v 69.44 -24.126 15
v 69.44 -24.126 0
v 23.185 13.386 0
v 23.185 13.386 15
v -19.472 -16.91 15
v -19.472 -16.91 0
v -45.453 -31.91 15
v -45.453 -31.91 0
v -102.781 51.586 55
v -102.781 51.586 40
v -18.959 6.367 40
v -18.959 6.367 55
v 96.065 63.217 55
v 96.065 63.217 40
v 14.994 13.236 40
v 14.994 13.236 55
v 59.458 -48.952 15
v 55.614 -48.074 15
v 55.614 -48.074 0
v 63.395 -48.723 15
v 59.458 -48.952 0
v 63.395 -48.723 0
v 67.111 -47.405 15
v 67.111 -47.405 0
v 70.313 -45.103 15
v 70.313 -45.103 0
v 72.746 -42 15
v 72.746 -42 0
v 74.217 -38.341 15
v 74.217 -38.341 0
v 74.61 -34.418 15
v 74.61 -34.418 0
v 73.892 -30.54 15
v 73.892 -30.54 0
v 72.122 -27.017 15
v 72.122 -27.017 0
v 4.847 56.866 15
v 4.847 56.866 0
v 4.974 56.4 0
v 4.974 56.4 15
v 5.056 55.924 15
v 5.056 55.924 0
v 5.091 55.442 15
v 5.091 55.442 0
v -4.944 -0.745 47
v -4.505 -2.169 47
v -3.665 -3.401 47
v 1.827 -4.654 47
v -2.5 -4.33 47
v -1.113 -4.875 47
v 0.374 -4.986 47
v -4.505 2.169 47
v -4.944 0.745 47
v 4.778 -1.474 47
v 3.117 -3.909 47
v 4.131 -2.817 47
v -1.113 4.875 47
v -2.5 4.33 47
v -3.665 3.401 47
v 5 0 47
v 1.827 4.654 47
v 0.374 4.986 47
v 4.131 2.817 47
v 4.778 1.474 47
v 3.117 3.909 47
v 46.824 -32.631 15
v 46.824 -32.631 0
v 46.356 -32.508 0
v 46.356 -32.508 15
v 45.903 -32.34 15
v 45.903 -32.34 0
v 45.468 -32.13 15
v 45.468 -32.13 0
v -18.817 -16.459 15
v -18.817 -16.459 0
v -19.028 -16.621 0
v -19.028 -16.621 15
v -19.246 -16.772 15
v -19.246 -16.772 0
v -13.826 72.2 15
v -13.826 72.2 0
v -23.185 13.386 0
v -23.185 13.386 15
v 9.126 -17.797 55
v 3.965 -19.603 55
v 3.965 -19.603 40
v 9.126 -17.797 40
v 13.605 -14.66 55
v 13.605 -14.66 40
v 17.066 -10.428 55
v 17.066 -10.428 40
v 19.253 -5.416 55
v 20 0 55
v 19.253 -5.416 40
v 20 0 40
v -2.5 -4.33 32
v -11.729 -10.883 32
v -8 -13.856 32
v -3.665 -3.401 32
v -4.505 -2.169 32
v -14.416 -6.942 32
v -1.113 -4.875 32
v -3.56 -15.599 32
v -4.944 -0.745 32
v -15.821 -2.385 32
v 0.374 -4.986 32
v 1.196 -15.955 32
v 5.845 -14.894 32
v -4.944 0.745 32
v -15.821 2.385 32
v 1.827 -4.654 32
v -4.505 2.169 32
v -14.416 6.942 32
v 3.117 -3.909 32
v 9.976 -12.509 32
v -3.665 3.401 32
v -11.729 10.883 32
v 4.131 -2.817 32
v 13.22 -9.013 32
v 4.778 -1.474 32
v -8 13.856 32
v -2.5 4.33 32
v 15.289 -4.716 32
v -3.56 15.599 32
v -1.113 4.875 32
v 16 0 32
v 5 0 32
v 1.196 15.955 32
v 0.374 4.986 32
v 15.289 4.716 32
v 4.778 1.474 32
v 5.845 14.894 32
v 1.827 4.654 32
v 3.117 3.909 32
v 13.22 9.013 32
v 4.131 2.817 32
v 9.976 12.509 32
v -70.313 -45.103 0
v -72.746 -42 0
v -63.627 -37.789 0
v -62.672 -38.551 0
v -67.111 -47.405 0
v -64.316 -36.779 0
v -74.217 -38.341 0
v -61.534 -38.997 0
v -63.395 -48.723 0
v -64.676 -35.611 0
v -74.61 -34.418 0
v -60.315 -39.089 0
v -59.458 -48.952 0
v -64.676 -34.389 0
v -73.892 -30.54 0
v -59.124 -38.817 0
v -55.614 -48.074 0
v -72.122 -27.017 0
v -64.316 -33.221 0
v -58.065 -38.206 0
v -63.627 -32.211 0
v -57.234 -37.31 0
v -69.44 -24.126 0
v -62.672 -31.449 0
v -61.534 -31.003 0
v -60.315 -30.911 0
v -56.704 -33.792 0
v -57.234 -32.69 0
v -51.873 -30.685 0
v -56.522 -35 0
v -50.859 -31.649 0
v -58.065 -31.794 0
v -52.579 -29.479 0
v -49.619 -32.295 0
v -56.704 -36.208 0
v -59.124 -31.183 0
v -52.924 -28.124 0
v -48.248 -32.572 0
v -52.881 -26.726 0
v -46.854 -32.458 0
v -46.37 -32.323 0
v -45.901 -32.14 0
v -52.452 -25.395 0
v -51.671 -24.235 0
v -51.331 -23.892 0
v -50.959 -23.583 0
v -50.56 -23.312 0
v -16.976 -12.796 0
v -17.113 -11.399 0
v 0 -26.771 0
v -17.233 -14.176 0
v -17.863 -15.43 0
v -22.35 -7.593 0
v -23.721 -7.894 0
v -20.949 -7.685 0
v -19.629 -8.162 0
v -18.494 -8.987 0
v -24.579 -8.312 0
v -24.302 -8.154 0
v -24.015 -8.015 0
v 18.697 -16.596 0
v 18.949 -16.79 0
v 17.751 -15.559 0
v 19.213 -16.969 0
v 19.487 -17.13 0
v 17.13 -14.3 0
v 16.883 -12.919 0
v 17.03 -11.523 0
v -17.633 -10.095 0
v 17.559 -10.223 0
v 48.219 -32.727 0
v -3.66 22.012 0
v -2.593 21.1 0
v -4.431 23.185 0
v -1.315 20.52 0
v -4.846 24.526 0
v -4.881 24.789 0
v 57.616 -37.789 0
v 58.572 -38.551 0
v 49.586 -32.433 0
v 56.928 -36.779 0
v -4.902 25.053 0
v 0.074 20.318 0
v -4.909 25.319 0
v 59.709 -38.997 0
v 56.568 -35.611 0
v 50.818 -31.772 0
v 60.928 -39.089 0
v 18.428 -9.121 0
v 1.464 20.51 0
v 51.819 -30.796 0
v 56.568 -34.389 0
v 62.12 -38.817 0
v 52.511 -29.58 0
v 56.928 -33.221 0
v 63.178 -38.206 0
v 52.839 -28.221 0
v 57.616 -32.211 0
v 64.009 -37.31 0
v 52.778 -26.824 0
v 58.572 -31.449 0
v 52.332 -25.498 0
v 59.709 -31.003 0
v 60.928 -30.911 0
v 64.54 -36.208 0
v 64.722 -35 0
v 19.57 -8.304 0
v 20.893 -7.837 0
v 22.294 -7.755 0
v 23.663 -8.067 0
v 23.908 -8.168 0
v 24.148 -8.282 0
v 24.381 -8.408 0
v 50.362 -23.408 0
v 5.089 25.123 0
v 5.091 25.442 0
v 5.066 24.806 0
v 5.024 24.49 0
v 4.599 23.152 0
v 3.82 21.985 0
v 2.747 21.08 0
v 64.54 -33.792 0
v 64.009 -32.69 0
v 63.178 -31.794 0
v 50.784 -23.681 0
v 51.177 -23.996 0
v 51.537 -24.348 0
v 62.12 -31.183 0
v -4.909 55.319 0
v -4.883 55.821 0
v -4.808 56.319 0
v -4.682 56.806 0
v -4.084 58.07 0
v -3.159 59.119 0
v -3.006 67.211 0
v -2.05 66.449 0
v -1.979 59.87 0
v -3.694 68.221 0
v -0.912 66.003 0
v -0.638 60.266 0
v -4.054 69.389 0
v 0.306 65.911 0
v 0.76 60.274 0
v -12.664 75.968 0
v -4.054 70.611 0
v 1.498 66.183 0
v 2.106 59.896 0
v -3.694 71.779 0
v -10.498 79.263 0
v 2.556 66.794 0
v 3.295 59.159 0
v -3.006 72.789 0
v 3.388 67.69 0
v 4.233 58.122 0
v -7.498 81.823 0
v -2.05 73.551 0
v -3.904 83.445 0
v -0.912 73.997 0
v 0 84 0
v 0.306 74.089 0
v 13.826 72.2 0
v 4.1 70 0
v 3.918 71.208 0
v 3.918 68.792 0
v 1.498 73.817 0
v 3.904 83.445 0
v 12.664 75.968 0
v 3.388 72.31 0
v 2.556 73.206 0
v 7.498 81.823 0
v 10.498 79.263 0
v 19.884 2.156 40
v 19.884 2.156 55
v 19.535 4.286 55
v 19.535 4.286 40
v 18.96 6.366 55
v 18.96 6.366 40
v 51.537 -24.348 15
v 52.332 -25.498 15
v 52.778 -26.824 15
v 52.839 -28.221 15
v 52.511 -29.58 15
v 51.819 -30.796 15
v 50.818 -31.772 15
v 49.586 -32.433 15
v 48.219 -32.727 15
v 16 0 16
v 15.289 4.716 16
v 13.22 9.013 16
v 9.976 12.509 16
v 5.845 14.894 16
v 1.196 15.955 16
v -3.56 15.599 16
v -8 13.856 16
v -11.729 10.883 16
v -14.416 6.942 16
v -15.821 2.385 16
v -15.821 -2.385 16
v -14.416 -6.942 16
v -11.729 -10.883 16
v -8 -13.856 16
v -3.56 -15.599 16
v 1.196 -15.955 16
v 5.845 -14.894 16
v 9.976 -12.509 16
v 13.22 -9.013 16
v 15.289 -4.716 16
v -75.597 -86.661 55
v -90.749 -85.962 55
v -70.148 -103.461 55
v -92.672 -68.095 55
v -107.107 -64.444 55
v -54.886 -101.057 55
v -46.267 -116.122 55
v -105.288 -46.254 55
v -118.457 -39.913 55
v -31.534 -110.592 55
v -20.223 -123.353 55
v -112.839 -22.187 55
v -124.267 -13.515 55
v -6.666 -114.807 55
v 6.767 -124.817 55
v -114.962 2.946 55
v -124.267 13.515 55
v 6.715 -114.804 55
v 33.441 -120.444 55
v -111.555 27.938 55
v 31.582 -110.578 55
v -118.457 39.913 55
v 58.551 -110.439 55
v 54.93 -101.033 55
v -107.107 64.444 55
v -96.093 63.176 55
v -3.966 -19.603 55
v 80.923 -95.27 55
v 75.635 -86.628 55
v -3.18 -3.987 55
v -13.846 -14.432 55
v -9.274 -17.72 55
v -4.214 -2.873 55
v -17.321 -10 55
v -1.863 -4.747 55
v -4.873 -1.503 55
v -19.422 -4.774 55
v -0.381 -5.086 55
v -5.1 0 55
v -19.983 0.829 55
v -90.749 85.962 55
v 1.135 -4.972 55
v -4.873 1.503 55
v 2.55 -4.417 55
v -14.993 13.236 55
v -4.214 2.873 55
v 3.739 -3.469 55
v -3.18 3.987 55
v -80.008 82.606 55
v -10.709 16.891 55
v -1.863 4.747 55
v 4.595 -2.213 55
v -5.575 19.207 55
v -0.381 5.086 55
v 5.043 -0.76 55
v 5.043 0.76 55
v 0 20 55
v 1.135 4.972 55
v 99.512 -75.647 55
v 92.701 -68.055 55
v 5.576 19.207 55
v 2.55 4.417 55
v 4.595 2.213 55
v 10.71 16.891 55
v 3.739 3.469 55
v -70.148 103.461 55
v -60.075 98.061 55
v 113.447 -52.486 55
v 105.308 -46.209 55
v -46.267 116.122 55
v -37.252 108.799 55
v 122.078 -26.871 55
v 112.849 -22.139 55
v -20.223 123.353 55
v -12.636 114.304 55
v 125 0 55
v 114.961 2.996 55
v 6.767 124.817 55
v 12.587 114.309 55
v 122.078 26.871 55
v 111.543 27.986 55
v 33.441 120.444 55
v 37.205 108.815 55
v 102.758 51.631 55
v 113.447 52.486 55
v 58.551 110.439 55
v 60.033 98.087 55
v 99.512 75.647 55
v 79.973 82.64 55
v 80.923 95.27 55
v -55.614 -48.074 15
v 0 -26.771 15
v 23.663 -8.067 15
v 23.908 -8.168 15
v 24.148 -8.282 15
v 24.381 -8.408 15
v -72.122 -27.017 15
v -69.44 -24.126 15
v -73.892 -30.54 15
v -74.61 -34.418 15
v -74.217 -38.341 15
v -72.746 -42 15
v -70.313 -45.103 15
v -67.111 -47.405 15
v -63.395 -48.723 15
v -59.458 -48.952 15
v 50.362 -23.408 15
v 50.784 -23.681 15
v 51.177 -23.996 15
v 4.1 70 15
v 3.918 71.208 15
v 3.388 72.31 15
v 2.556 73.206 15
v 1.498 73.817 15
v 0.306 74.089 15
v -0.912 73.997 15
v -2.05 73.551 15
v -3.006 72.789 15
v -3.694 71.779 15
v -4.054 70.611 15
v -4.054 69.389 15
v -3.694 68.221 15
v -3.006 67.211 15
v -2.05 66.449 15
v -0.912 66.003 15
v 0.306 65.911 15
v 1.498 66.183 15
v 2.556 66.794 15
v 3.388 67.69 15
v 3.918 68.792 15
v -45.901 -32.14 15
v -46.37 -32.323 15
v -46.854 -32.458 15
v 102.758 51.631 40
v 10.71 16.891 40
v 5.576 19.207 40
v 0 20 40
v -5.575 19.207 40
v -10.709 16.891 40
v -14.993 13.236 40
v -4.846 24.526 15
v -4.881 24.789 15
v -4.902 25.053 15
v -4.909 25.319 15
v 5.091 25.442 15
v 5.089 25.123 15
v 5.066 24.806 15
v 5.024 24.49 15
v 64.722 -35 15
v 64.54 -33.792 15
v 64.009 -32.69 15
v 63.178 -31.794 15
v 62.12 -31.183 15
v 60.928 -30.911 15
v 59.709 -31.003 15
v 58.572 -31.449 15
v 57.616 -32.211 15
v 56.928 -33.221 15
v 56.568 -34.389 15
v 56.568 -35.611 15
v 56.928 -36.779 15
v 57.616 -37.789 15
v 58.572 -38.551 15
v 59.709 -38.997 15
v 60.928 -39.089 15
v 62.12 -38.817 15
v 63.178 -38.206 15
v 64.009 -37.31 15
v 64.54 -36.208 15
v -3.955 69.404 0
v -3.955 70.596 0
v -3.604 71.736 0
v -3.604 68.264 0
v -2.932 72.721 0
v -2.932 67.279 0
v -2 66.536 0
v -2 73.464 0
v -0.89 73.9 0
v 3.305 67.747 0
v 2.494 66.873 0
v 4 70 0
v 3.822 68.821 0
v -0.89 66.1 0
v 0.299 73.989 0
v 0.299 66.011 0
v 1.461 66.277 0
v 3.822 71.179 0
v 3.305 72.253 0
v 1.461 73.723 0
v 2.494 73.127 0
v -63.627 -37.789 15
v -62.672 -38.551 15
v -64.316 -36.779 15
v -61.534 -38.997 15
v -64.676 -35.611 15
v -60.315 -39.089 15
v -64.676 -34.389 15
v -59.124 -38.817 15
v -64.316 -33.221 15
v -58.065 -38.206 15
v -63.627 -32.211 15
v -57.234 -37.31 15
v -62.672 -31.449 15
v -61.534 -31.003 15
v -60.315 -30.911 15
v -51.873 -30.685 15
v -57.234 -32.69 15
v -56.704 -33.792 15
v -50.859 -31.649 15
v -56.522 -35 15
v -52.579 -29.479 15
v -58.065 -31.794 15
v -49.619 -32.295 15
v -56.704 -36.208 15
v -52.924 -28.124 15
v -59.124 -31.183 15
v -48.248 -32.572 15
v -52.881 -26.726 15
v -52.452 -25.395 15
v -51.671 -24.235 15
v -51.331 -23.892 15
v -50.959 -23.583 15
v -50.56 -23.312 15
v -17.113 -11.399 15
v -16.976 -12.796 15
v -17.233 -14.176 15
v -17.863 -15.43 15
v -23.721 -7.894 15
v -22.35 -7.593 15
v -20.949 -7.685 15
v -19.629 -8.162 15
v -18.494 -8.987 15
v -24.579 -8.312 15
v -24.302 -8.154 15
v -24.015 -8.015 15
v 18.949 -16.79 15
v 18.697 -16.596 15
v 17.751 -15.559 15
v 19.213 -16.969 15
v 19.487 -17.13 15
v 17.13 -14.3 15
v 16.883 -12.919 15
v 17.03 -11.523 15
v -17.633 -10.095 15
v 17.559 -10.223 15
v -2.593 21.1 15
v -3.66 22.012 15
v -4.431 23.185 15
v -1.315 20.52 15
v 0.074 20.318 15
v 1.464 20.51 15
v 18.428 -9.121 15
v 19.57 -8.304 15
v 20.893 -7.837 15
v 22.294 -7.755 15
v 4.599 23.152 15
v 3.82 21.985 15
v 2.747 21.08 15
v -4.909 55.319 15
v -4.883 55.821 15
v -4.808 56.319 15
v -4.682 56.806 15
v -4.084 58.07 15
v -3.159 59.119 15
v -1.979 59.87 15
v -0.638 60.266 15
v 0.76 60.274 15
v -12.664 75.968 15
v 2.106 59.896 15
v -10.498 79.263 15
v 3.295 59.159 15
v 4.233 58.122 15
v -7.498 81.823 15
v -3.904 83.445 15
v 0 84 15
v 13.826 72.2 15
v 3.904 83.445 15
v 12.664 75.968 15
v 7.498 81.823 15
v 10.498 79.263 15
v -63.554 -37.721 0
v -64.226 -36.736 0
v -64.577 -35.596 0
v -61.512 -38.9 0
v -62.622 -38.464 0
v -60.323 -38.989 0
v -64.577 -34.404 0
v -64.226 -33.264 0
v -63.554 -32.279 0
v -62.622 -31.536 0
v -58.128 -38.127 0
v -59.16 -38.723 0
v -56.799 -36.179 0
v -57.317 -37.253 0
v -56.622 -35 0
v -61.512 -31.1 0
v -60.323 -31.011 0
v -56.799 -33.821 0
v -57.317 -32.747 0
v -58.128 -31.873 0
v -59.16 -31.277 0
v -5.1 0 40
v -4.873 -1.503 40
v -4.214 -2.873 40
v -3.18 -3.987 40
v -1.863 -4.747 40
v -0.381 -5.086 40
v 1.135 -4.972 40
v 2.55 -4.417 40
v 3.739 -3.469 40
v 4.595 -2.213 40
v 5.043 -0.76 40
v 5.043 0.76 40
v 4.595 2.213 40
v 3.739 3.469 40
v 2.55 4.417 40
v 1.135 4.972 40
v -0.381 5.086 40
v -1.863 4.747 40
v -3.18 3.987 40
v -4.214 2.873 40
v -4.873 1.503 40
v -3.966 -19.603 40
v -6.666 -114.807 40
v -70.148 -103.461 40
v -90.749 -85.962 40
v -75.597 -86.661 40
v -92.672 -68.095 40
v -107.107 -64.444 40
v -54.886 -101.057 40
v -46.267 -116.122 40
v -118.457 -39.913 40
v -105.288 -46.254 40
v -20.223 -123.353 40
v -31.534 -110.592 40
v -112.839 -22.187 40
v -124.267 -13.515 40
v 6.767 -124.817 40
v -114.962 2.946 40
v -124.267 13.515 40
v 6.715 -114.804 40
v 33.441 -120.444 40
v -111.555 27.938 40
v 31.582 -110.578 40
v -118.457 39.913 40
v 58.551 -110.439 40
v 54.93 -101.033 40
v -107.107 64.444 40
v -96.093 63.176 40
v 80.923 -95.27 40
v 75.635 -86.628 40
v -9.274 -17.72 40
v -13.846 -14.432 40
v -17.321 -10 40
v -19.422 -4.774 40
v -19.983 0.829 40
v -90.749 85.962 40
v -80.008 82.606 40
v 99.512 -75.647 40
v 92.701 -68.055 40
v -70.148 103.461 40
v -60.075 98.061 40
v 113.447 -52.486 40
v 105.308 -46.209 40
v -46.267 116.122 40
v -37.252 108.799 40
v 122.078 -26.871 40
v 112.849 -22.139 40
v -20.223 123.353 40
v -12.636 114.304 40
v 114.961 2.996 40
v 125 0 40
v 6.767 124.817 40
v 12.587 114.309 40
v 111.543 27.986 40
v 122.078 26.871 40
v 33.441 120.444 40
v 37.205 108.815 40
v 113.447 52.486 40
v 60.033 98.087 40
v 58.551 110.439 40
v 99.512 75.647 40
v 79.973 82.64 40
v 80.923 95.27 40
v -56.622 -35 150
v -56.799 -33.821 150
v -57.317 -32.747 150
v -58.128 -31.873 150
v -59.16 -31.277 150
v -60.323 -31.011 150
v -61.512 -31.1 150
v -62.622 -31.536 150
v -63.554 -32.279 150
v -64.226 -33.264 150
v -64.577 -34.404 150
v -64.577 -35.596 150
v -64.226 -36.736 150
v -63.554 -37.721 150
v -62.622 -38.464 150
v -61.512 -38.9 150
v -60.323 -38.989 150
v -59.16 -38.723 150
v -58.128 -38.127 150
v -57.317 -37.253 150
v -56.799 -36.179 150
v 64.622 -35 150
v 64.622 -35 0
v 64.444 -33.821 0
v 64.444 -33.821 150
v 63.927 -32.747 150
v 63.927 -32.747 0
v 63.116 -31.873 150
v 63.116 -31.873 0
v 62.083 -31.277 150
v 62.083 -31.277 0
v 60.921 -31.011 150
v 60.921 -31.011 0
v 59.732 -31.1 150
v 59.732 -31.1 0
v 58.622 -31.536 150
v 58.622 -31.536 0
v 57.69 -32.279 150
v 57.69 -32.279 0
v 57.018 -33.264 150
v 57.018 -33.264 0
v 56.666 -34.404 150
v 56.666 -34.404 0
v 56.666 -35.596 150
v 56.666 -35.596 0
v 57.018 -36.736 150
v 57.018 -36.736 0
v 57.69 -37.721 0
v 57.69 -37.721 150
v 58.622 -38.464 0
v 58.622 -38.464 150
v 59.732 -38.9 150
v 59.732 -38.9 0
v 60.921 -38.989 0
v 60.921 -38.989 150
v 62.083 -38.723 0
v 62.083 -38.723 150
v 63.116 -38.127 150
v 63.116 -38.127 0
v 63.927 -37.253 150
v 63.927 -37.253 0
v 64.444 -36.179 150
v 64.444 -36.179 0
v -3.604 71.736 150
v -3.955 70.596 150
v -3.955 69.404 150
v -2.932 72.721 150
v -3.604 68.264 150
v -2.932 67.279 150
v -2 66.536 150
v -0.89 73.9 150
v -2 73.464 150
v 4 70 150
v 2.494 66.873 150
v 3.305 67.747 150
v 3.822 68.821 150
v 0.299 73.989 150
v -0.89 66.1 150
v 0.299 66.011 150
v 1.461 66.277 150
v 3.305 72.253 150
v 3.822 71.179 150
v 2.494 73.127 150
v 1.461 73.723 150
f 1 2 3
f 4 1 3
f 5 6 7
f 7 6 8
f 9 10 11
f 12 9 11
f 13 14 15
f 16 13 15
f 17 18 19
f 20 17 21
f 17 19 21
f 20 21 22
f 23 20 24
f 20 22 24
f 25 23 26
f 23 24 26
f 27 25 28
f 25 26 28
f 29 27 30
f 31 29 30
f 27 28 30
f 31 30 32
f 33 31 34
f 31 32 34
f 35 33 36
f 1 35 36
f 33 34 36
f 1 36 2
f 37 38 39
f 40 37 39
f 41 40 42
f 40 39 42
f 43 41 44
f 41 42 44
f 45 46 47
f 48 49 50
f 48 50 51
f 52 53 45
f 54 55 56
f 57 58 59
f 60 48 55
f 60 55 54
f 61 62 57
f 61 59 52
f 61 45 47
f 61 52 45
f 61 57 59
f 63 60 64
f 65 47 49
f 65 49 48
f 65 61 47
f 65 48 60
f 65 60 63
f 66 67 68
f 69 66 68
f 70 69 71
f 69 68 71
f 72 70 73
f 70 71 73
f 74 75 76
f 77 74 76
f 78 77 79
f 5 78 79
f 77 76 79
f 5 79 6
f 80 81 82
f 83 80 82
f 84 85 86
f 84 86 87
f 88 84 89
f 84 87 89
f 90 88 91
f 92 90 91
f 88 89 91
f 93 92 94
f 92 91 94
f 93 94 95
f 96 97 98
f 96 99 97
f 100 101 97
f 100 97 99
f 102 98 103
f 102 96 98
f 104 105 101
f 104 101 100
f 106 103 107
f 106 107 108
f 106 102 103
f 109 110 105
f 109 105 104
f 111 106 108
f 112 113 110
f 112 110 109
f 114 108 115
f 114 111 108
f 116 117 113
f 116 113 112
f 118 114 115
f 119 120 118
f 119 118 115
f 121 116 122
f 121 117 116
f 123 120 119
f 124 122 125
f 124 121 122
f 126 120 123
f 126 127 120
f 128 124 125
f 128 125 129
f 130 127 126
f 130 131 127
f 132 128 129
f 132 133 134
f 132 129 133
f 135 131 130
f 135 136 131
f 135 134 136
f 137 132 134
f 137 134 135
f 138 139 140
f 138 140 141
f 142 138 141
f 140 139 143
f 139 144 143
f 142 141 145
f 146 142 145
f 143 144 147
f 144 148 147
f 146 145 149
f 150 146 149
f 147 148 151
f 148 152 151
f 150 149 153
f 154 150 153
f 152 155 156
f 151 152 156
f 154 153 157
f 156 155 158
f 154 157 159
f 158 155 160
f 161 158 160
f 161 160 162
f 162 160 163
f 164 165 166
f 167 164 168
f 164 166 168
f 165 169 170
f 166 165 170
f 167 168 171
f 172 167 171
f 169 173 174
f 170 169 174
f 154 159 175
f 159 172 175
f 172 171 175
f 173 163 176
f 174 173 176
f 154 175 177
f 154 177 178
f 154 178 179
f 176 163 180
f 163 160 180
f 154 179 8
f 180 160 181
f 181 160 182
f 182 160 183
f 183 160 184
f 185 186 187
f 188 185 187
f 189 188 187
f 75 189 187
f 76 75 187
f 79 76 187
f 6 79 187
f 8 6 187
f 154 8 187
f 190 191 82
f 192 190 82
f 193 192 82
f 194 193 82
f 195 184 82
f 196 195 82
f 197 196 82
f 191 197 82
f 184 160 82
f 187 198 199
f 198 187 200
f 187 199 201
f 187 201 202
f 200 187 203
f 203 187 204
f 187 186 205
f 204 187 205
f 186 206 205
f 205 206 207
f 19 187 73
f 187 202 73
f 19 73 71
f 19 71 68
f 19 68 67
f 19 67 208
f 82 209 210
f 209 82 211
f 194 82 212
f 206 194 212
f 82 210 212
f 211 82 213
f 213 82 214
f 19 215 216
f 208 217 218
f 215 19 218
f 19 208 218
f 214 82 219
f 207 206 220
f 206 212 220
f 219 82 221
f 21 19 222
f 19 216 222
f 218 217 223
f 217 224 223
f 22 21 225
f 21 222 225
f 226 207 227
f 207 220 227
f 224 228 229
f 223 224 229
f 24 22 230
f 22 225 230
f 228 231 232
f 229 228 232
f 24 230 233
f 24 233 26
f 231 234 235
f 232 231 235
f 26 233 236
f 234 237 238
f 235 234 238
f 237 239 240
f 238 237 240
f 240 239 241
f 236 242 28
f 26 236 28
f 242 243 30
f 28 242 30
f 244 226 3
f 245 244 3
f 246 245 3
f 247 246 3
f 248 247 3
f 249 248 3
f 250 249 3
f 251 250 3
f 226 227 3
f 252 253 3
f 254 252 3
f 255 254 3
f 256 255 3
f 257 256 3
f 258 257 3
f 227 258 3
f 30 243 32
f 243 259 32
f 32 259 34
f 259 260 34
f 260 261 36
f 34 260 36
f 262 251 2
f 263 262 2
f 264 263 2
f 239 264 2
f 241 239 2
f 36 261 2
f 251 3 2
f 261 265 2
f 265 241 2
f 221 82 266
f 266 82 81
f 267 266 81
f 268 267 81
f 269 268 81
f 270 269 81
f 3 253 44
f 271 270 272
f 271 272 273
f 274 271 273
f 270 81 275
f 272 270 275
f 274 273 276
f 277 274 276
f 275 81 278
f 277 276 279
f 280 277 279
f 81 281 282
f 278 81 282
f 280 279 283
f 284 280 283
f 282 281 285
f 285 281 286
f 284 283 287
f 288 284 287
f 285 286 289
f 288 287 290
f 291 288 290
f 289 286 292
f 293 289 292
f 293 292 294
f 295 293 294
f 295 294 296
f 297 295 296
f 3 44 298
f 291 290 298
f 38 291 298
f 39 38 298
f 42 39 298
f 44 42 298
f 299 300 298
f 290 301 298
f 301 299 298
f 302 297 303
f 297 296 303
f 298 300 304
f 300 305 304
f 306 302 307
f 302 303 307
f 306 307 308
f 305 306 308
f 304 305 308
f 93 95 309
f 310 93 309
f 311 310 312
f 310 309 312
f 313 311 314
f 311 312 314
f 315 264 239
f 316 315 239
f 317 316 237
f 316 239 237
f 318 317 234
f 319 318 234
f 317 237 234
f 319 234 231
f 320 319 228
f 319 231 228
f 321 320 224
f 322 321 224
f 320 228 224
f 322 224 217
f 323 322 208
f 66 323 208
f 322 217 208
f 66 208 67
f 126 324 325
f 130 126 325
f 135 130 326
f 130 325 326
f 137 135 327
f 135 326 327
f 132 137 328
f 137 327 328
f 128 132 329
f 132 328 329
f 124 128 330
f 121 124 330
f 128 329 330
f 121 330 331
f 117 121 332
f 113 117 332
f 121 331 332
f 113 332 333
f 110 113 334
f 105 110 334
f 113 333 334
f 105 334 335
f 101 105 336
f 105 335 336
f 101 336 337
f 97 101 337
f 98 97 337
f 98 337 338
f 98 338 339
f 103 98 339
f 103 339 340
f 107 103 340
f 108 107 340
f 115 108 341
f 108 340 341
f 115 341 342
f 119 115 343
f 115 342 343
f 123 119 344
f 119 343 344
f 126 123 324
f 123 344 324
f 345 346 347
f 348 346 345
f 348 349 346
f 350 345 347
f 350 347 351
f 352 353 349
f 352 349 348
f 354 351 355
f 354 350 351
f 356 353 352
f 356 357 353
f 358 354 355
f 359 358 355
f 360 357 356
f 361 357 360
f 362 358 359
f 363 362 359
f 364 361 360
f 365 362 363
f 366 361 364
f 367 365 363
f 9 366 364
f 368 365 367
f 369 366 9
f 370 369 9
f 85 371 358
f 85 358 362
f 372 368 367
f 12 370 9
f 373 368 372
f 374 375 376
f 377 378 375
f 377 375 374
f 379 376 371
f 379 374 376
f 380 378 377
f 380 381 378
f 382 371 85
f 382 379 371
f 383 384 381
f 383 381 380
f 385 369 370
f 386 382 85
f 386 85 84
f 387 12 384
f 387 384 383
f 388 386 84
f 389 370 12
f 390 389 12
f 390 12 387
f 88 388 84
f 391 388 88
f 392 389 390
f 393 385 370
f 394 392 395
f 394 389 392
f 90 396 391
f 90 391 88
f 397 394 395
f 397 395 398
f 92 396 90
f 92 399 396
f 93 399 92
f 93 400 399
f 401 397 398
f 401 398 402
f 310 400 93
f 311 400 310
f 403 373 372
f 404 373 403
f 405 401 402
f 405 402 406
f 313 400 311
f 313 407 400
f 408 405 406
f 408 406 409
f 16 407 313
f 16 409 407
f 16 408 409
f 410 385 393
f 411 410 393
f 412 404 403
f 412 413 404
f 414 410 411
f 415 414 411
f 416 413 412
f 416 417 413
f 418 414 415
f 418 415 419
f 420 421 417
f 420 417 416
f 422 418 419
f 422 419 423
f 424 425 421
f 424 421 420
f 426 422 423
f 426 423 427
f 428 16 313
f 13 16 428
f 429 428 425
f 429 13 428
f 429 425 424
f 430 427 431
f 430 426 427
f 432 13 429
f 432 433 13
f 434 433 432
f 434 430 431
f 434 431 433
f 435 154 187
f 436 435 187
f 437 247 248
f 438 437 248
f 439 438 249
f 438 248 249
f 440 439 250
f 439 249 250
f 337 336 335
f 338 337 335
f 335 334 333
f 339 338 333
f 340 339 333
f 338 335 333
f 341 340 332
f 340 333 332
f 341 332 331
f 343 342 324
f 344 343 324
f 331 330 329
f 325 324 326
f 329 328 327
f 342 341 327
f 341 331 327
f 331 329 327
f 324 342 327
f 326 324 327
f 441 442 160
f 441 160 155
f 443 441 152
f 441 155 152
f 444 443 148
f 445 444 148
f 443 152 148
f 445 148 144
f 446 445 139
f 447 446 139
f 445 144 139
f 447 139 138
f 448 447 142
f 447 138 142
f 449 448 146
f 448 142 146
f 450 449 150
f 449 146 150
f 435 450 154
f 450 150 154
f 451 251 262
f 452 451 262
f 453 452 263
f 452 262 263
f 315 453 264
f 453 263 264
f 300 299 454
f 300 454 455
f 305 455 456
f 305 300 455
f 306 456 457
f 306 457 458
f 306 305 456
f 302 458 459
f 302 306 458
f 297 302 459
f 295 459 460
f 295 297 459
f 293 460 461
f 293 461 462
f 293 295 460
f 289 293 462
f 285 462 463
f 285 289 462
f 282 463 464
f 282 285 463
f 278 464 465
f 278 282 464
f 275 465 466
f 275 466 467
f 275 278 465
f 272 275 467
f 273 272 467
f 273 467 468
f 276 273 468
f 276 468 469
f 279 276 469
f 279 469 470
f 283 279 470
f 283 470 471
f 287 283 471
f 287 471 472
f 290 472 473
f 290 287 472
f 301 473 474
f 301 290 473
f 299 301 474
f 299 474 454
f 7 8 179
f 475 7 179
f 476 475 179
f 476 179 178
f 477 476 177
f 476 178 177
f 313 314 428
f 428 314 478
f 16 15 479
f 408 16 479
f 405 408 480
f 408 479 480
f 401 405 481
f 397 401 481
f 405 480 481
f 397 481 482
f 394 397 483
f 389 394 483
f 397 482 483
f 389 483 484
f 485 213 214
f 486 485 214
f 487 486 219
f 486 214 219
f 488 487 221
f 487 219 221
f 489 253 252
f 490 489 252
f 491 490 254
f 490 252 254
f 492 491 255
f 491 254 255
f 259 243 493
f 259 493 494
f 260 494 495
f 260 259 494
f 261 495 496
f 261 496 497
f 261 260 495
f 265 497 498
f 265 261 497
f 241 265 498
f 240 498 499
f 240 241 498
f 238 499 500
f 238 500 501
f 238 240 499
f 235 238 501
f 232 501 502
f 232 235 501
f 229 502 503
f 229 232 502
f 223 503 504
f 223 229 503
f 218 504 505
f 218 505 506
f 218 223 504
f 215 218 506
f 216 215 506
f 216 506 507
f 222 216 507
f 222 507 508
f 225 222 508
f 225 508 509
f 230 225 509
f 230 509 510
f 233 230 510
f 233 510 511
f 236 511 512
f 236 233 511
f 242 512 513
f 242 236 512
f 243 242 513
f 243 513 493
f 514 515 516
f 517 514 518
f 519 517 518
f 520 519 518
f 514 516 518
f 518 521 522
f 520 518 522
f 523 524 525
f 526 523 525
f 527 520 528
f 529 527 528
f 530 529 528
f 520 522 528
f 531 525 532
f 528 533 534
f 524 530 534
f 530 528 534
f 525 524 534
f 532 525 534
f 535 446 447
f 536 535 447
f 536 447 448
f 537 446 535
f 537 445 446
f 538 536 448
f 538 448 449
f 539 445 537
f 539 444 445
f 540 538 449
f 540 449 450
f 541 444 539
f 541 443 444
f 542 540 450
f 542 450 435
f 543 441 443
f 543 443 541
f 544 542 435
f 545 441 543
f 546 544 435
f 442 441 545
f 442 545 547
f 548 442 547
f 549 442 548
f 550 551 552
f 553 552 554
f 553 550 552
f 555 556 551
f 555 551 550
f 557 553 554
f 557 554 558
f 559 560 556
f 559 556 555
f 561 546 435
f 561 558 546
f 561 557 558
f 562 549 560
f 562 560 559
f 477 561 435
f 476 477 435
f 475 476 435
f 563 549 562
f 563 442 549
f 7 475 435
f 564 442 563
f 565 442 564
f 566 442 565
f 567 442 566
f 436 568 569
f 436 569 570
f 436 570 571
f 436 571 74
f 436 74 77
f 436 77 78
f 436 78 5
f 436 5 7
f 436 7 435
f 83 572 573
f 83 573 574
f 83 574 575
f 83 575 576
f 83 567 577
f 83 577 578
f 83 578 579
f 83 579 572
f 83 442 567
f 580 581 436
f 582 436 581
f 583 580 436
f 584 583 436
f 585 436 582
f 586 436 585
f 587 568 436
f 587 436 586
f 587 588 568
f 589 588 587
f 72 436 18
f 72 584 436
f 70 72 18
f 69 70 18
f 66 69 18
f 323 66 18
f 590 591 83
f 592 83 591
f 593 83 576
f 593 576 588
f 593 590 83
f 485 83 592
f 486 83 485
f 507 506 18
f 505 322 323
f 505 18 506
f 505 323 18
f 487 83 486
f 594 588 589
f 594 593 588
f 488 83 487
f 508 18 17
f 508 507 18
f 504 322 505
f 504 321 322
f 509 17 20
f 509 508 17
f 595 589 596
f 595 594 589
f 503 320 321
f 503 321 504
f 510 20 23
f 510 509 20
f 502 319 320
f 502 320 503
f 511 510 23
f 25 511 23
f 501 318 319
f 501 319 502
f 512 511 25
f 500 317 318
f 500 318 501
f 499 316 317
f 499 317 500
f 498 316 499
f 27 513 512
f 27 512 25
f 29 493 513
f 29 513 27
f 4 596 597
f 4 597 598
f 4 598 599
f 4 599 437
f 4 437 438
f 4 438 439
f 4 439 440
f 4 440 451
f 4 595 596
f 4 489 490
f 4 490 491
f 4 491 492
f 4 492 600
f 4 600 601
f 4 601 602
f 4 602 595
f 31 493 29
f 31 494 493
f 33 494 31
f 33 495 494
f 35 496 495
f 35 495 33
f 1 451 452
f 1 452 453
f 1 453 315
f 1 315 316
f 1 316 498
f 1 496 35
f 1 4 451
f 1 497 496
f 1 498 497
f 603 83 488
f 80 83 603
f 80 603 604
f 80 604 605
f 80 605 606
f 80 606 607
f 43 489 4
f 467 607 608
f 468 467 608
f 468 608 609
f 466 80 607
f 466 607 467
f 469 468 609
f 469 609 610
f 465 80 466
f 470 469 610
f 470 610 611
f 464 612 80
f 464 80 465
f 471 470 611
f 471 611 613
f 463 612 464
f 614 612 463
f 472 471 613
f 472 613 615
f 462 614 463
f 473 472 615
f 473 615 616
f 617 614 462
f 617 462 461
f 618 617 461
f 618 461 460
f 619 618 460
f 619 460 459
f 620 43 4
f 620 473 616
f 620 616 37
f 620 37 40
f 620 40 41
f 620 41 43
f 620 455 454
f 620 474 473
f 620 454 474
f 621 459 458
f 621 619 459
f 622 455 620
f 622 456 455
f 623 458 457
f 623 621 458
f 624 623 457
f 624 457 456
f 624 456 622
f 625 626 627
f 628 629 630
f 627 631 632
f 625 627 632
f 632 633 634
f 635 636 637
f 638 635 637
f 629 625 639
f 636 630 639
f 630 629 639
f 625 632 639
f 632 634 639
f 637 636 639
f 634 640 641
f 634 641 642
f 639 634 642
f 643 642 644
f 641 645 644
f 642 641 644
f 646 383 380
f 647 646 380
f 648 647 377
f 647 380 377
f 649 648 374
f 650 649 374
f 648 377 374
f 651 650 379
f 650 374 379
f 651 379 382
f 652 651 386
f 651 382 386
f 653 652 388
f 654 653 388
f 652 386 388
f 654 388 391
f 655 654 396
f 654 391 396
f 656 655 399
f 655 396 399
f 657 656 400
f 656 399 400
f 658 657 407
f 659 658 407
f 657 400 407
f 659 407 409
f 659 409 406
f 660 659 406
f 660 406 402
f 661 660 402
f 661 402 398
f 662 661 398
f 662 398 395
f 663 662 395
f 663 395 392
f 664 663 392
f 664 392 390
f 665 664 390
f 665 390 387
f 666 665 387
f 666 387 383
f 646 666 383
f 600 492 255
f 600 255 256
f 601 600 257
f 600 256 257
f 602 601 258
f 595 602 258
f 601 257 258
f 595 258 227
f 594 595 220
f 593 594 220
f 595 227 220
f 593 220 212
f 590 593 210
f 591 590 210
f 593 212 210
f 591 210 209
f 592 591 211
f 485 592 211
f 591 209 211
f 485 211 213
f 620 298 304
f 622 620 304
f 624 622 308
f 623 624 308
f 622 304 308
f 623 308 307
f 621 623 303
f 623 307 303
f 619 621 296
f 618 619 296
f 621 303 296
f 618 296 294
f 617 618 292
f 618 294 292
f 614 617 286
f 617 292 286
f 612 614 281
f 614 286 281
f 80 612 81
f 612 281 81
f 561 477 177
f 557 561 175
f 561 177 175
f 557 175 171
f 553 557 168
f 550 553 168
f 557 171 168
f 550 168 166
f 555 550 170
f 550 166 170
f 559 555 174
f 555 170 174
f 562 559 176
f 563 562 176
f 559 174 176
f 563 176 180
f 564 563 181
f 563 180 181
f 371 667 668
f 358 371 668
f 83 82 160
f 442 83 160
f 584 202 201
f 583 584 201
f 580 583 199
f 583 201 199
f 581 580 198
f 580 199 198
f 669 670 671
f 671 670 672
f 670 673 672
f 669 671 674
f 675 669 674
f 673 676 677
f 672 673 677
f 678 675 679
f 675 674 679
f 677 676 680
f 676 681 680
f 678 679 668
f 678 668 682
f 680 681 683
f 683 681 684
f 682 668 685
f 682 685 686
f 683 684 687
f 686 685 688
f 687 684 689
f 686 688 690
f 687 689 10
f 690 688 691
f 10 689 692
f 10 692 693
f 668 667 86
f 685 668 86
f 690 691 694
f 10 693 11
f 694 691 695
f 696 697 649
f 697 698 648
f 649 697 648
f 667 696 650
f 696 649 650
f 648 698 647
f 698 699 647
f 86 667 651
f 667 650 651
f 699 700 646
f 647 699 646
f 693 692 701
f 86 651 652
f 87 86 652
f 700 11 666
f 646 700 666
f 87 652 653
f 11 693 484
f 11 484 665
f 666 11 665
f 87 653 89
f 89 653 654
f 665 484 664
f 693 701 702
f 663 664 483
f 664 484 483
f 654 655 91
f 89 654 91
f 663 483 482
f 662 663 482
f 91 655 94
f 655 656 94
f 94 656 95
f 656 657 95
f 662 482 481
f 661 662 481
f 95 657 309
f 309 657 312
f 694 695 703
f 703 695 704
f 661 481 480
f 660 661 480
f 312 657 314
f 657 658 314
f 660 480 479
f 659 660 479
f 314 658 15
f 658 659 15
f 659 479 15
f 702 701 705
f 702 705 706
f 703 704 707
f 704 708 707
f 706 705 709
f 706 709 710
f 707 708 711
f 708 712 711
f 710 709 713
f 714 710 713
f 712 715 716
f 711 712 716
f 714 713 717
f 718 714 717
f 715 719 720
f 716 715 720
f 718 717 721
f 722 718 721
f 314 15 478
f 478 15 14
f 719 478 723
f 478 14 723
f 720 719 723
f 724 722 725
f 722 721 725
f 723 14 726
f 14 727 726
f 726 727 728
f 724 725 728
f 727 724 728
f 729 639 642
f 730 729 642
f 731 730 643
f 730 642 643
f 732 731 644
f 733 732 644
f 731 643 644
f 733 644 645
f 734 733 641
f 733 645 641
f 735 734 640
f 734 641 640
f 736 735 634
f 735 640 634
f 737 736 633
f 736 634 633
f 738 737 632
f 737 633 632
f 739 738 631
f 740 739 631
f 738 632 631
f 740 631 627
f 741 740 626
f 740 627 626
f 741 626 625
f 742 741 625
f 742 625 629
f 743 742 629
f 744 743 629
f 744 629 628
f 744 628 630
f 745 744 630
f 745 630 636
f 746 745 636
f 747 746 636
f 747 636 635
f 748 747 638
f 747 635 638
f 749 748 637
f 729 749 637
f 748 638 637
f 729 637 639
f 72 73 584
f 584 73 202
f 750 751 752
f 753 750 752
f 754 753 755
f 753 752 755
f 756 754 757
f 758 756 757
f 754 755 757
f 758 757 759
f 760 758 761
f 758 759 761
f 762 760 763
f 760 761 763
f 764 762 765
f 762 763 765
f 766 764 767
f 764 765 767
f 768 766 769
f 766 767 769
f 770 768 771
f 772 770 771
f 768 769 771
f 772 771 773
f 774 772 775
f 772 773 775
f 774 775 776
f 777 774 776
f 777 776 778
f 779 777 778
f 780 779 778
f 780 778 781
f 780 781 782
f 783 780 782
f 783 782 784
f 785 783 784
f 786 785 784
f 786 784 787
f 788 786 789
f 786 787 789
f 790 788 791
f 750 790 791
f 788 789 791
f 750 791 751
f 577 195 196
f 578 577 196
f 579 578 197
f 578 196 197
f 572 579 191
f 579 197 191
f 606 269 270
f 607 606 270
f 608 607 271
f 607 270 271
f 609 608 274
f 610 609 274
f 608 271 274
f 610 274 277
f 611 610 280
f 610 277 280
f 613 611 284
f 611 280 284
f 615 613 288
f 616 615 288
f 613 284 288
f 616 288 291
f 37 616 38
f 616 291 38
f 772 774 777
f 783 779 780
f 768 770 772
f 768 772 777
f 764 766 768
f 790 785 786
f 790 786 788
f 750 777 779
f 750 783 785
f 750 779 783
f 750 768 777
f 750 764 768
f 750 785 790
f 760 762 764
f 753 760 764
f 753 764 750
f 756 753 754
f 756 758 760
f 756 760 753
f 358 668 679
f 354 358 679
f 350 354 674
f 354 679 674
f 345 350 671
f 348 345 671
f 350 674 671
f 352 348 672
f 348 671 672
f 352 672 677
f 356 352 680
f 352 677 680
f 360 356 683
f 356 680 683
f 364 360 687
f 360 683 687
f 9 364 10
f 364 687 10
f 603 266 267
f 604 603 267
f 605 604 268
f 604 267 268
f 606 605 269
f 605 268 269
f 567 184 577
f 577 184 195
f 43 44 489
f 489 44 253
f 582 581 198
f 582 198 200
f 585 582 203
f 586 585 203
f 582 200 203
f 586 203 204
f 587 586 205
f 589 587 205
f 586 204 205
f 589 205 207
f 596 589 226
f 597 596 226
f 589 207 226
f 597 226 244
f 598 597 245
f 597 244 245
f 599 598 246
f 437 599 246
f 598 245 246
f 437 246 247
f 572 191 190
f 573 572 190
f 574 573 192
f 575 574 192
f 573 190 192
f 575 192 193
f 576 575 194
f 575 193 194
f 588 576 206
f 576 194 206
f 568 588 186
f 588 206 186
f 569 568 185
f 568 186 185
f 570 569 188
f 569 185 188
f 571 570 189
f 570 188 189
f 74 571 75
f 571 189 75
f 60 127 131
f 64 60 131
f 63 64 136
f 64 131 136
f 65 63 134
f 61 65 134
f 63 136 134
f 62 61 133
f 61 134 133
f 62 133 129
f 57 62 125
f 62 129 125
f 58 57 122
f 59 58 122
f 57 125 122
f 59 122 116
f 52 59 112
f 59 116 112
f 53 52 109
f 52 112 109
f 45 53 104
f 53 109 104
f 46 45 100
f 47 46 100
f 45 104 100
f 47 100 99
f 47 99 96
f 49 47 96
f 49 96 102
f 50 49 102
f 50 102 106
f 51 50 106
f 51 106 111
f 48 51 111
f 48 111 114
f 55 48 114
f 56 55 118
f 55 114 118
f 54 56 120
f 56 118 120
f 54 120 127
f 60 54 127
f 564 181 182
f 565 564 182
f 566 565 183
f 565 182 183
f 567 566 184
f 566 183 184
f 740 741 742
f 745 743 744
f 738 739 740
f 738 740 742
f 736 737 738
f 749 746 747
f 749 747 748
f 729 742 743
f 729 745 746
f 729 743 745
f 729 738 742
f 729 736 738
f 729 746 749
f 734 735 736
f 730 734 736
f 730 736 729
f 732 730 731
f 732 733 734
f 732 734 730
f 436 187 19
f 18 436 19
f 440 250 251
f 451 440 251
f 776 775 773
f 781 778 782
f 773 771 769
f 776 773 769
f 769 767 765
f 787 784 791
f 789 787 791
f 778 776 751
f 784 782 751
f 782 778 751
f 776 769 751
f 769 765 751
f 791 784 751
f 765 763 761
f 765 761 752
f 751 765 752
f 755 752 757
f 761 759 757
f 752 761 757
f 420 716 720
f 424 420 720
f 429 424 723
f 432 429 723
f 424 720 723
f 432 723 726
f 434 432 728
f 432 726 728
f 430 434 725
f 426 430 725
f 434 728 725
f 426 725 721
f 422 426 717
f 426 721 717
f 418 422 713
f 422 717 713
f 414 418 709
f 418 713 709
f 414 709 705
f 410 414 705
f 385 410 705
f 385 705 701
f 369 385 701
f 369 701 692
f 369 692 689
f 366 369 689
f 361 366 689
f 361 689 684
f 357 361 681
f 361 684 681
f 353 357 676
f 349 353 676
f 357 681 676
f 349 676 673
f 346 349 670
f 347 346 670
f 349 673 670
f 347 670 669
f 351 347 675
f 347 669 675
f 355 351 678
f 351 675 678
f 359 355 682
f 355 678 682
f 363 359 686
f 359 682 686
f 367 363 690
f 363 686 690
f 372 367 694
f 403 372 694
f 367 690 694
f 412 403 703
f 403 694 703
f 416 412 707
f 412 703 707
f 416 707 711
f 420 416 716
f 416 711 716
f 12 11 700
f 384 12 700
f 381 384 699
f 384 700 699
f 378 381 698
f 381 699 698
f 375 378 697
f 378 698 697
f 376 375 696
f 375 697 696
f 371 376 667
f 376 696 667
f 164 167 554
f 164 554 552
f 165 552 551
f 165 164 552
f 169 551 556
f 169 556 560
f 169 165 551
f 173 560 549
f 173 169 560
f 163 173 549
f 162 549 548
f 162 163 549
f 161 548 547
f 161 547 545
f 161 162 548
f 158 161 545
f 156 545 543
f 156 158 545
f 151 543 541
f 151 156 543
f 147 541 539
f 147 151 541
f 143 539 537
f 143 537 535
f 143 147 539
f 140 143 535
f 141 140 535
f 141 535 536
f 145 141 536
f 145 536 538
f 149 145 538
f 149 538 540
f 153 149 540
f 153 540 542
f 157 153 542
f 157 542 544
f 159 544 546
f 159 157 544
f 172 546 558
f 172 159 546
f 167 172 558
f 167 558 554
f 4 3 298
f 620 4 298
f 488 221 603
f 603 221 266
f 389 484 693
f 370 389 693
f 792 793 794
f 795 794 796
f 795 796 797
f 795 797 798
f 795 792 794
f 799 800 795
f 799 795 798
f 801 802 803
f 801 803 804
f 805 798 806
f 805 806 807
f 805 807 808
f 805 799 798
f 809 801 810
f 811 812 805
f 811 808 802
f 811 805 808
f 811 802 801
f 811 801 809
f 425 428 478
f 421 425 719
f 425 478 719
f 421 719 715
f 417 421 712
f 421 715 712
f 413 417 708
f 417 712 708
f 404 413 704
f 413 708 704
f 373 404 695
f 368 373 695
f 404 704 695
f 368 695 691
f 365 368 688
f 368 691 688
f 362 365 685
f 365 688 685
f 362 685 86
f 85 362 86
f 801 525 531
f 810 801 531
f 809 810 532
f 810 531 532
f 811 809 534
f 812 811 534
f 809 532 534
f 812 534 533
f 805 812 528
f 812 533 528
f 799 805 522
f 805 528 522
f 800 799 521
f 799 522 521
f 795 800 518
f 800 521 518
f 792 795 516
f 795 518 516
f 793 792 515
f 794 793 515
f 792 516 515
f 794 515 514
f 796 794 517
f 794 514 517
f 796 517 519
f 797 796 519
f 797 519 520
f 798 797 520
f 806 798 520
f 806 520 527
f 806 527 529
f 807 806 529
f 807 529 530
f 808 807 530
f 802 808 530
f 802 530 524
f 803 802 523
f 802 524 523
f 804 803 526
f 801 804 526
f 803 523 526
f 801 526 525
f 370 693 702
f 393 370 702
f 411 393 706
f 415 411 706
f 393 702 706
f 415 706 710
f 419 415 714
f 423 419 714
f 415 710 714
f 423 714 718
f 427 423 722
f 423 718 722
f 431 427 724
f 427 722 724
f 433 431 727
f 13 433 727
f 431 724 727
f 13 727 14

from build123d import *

# Parameters (mm, degrees)
F0_R      = 4
F1_DEPTH  = 150
F2_R      = 4.1
F3_DEPTH  = 15
F5_R      = 125
F6_DEPTH  = 15
F7_D      = 10.2
F9_R      = 16
F10_DEPTH = 16
F11_R     = 5
F12_DEPTH = 15


# Not quite as in the source:
# - a feature names something its author has since deleted; it is built from what else it names


with BuildPart() as f1:
    # F0 (on Top) → F1 (new body)
    with BuildSketch(Plane.XY):
        with Locations((0, 70)):
            Circle(F0_R)
    extrude(amount=F1_DEPTH)


with BuildPart() as f1b:
    # F0 (on Top) → F1, piece 2 (new body)
    with BuildSketch(Plane.XY):
        with Locations((-60.6217782649, -35)):
            Circle(F0_R)
    extrude(amount=F1_DEPTH)


with BuildPart() as f1c:
    # F0 (on Top) → F1, piece 3 (new body)
    with BuildSketch(Plane.XY):
        with Locations((60.6217782649, -35)):
            Circle(F0_R)
    extrude(amount=F1_DEPTH)


with BuildPart() as f3:
    # F2 (on Top) → F3 (new body)
    with BuildSketch(Plane.XY):
        with BuildLine():
            ThreePointArc((-15.7469411811, 19.4173593323), (-10.6083266094, 22.6376546168), (-4.8455068732, 24.5259263462))
            ThreePointArc((-4.8455068732, 24.5259263462), (-4.8928885521, 24.9209603499), (-4.9087158404, 25.3185108304))
            Line((-4.9087158404, 25.3185108304), (-4.9087158404, 55.3185108304))
            ThreePointArc((-4.9087158404, 55.3185108304), (-4.851787509, 56.0709261545), (-4.6822986521, 56.8062105772))
            ThreePointArc((-4.6822986521, 56.8062105772), (-12.0366957637, 62.8503178328), (-13.8260623462, 72.2))
            Line((-13.8260623462, 72.2), (-23.1845919064, 13.3856303782))
            Line((-23.1845919064, 13.3856303782), (-15.7469411811, 19.4173593323))
        make_face()
        with BuildLine():
            ThreePointArc((14, 70), (13.956447844, 71.1034326336), (13.8260623462, 72.2))
            ThreePointArc((13.8260623462, 72.2), (0, 84), (-13.8260623462, 72.2))
            ThreePointArc((-13.8260623462, 72.2), (-12.0366957637, 62.8503178328), (-4.6822986521, 56.8062105772))
            ThreePointArc((-4.6822986521, 56.8062105772), (0.0606919076, 60.3191708855), (4.8473554351, 56.865954725))
            ThreePointArc((4.8473554351, 56.865954725), (11.486143306, 61.9957191482), (14, 70))
        make_face()
        with Locations((0, 70)):
            Circle(F2_R, mode=Mode.SUBTRACT)
        with BuildLine():
            ThreePointArc((5.0236987184, 24.4900480029), (10.6905525136, 22.598939952), (15.7469411811, 19.4173593323))
            Line((15.7469411811, 19.4173593323), (23.1845919064, 13.3856303782))
            Line((23.1845919064, 13.3856303782), (13.8260623462, 72.2))
            ThreePointArc((13.8260623462, 72.2), (13.956447844, 71.1034326336), (14, 70))
            ThreePointArc((14, 70), (11.486143306, 61.9957191482), (4.8473554351, 56.865954725))
            ThreePointArc((4.8473554351, 56.865954725), (5.0210368519, 56.1626662615), (5.0912841596, 55.4416633397))
            Line((5.0912841596, 55.4416633397), (5.0912841596, 25.4416633397))
            ThreePointArc((5.0912841596, 25.4416633397), (5.0802361713, 24.9642402993), (5.0236987184, 24.4900480029))
        make_face()
        with BuildLine():
            ThreePointArc((23.6628287038, -8.0666311267), (24.6634417468, -4.0883543391), (25, 0))
            ThreePointArc((25, 0), (24.9222282929, 1.9704154171), (24.6893970467, 3.9285714286))
            ThreePointArc((24.6893970467, 3.9285714286), (21.6506350946, 12.5), (15.7469411811, 19.4173593323))
            ThreePointArc((15.7469411811, 19.4173593323), (10.6905525136, 22.598939952), (5.0236987184, 24.4900480029))
            ThreePointArc((5.0236987184, 24.4900480029), (0.0738629344, 20.3177855481), (-4.8455068732, 24.5259263462))
            ThreePointArc((-4.8455068732, 24.5259263462), (-10.6083266094, 22.6376546168), (-15.7469411811, 19.4173593323))
            ThreePointArc((-15.7469411811, 19.4173593323), (-21.6506350946, 12.5), (-24.6893970467, 3.9285714286))
            ThreePointArc((-24.6893970467, 3.9285714286), (-24.9165323538, -2.0411799187), (-23.7208530697, -7.8943732904))
            ThreePointArc((-23.7208530697, -7.8943732904), (-17.6326499005, -10.0949255965), (-18.8173218306, -16.4592952196))
            ThreePointArc((-18.8173218306, -16.4592952196), (-14.3006206755, -20.5059076438), (-8.9424558656, -23.3459307609))
            ThreePointArc((-8.9424558656, -23.3459307609), (0, -25), (8.9424558656, -23.3459307609))
            ThreePointArc((8.9424558656, -23.3459307609), (14.2259798402, -20.5577600333), (18.6971543512, -16.5956747126))
            ThreePointArc((18.6971543512, -16.5956747126), (17.5587869661, -10.2228599516), (23.6628287038, -8.0666311267))
        make_face()
        with BuildLine():
            Line((-24.6893970467, 3.9285714286), (-23.1845919064, 13.3856303782))
            Line((-23.1845919064, 13.3856303782), (-69.4400653263, -24.1262787739))
            ThreePointArc((-69.4400653263, -24.1262787739), (-60.5360847426, -21.000262266), (-51.6710391199, -24.2350444145))
            ThreePointArc((-51.6710391199, -24.2350444145), (-51.1488141527, -23.7329876636), (-50.5595309601, -23.3116502498))
            Line((-50.5595309601, -23.3116502498), (-24.5787688465, -8.3116502498))
            ThreePointArc((-24.5787688465, -8.3116502498), (-24.1597843711, -8.0825065681), (-23.7208530697, -7.8943732904))
            ThreePointArc((-23.7208530697, -7.8943732904), (-24.9165323538, -2.0411799187), (-24.6893970467, 3.9285714286))
        make_face()
        with BuildLine():
            ThreePointArc((-69.4400653263, -24.1262787739), (-72.7461339179, -42), (-55.6140029802, -48.0737212261))
            ThreePointArc((-55.6140029802, -48.0737212261), (-49.0868562022, -42.9338246141), (-46.6217782649, -35))
            ThreePointArc((-46.6217782649, -35), (-46.6800730977, -33.723733166), (-46.8544721266, -32.4580948694))
            ThreePointArc((-46.8544721266, -32.4580948694), (-52.2682802758, -30.107024709), (-51.6710391199, -24.2350444145))
            ThreePointArc((-51.6710391199, -24.2350444145), (-60.5360847426, -21.000262266), (-69.4400653263, -24.1262787739))
        make_face()
        with Locations((-60.6217782649, -35)):
            Circle(F2_R, mode=Mode.SUBTRACT)
        with BuildLine():
            Line((0, -26.7712607564), (-8.9424558656, -23.3459307609))
            ThreePointArc((-8.9424558656, -23.3459307609), (-14.3006206755, -20.5059076438), (-18.8173218306, -16.4592952196))
            ThreePointArc((-18.8173218306, -16.4592952196), (-19.1357404737, -16.697845959), (-19.4721156449, -16.910328033))
            Line((-19.4721156449, -16.910328033), (-45.4528777584, -31.910328033))
            ThreePointArc((-45.4528777584, -31.910328033), (-46.132952709, -32.2372343138), (-46.8544721266, -32.4580948694))
            ThreePointArc((-46.8544721266, -32.4580948694), (-46.6800730977, -33.723733166), (-46.6217782649, -35))
            ThreePointArc((-46.6217782649, -35), (-49.0868562022, -42.9338246141), (-55.6140029802, -48.0737212261))
            Line((-55.6140029802, -48.0737212261), (0, -26.7712607564))
        make_face()
        with BuildLine():
            ThreePointArc((19.487484687, -17.1300130899), (19.0795481998, -16.8817337312), (18.6971543512, -16.5956747126))
            ThreePointArc((18.6971543512, -16.5956747126), (14.2259798402, -20.5577600333), (8.9424558656, -23.3459307609))
            Line((8.9424558656, -23.3459307609), (0, -26.7712607564))
            Line((0, -26.7712607564), (55.6140029802, -48.0737212261))
            ThreePointArc((55.6140029802, -48.0737212261), (48.4548029798, -41.9256560998), (46.8236836847, -32.6309103105))
            ThreePointArc((46.8236836847, -32.6309103105), (46.1277773008, -32.4296785979), (45.4682468005, -32.1300130899))
            Line((45.4682468005, -32.1300130899), (19.487484687, -17.1300130899))
        make_face()
        with BuildLine():
            ThreePointArc((24.6893970467, 3.9285714286), (24.9222282929, 1.9704154171), (25, 0))
            ThreePointArc((25, 0), (24.6634417468, -4.0883543391), (23.6628287038, -8.0666311267))
            ThreePointArc((23.6628287038, -8.0666311267), (24.0286290258, -8.2231143909), (24.3808314853, -8.4081827974))
            Line((24.3808314853, -8.4081827974), (50.3615935989, -23.4081827974))
            ThreePointArc((50.3615935989, -23.4081827974), (50.984740218, -23.8336918407), (51.5367707787, -24.3481157078))
            ThreePointArc((51.5367707787, -24.3481157078), (60.448319761, -21.0010746074), (69.4400653263, -24.1262787739))
            Line((69.4400653263, -24.1262787739), (23.1845919064, 13.3856303782))
            Line((23.1845919064, 13.3856303782), (24.6893970467, 3.9285714286))
        make_face()
        with BuildLine():
            ThreePointArc((74.6217782649, -35), (73.2601329612, -28.97737677), (69.4400653263, -24.1262787739))
            ThreePointArc((69.4400653263, -24.1262787739), (60.448319761, -21.0010746074), (51.5367707787, -24.3481157078))
            ThreePointArc((51.5367707787, -24.3481157078), (52.2075883683, -30.2121461765), (46.8236836847, -32.6309103105))
            ThreePointArc((46.8236836847, -32.6309103105), (48.4548029798, -41.9256560998), (55.6140029802, -48.0737212261))
            ThreePointArc((55.6140029802, -48.0737212261), (68.555602879, -46.5349220627), (74.6217782649, -35))
        make_face()
        with Locations((60.6217782649, -35)):
            Circle(F2_R, mode=Mode.SUBTRACT)
        with BuildLine():
            ThreePointArc((15.7469411811, 19.4173593323), (21.6506350946, 12.5), (24.6893970467, 3.9285714286))
            Line((24.6893970467, 3.9285714286), (23.1845919064, 13.3856303782))
            Line((23.1845919064, 13.3856303782), (15.7469411811, 19.4173593323))
        make_face()
        with BuildLine():
            ThreePointArc((-24.6893970467, 3.9285714286), (-21.6506350946, 12.5), (-15.7469411811, 19.4173593323))
            Line((-15.7469411811, 19.4173593323), (-23.1845919064, 13.3856303782))
            Line((-23.1845919064, 13.3856303782), (-24.6893970467, 3.9285714286))
        make_face()
        with BuildLine():
            Line((0, -26.7712607564), (8.9424558656, -23.3459307609))
            ThreePointArc((8.9424558656, -23.3459307609), (0, -25), (-8.9424558656, -23.3459307609))
            Line((-8.9424558656, -23.3459307609), (0, -26.7712607564))
        make_face()
    extrude(amount=F3_DEPTH)


with BuildPart() as f6:
    # F5 (on offset) → F6 (new body)
    with BuildSketch(Plane.XY.offset(40)):
        Circle(F5_R)
        with BuildLine():
            ThreePointArc((102.7583822566, 51.6305614534), (111.8977523445, 26.5309822706), (115, 0))
            ThreePointArc((115, 0), (83.6577855811, -78.9073818579), (6.7152189274, -114.8037709954))
            ThreePointArc((6.7152189274, -114.8037709954), (0.0247447273, -114.9999973378), (-6.665813298, -114.8066502128))
            ThreePointArc((-6.665813298, -114.8066502128), (-99.5805467661, -57.5214282313), (-102.7805915959, 51.5863353146))
            ThreePointArc((-102.7805915959, 51.5863353146), (-99.6052914933, 57.4785691065), (-96.0925689586, 63.1760887593))
            ThreePointArc((-96.0925689586, 63.1760887593), (-0.0247447273, 114.9999973378), (96.0653726685, 63.2174356808))
            ThreePointArc((96.0653726685, 63.2174356808), (99.5805467661, 57.5214282313), (102.7583822566, 51.6305614534))
        make_face(mode=Mode.SUBTRACT)
        with BuildLine():
            Line((-14.9932737383, 13.2363795129), (-96.0925689586, 63.1760887593))
            ThreePointArc((-96.0925689586, 63.1760887593), (-99.6052914933, 57.4785691065), (-102.7805915959, 51.5863353146))
            Line((-102.7805915959, 51.5863353146), (-18.9593623085, 6.3673056198))
            ThreePointArc((-18.9593623085, 6.3673056198), (-17.3202603233, 10.0004291074), (-14.9932737383, 13.2363795129))
        make_face()
        with BuildLine():
            Line((18.9596777814, 6.3663661868), (102.7583822566, 51.6305614534))
            ThreePointArc((102.7583822566, 51.6305614534), (99.5805467661, 57.5214282313), (96.0653726685, 63.2174356808))
            Line((96.0653726685, 63.2174356808), (14.9939295747, 13.2356365888))
            ThreePointArc((14.9939295747, 13.2356365888), (17.3207558174, 9.9995708864), (18.9596777814, 6.3663661868))
        make_face()
        with BuildLine():
            ThreePointArc((-6.665813298, -114.8066502128), (0.0247447273, -114.9999973378), (6.7152189274, -114.8037709954))
            Line((6.7152189274, -114.8037709954), (3.9654327338, -19.6029422086))
            ThreePointArc((3.9654327338, -19.6029422086), (-0.0004954941, -19.9999999939), (-3.9664040432, -19.6027456997))
            Line((-3.9664040432, -19.6027456997), (-6.665813298, -114.8066502128))
        make_face()
        with BuildLine():
            ThreePointArc((20, 0), (19.7382060435, 3.2254026393), (18.9596777814, 6.3663661868))
            ThreePointArc((18.9596777814, 6.3663661868), (17.3207558174, 9.9995708864), (14.9939295747, 13.2356365888))
            ThreePointArc((14.9939295747, 13.2356365888), (0.0004954941, 19.9999999939), (-14.9932737383, 13.2363795129))
            ThreePointArc((-14.9932737383, 13.2363795129), (-17.3202603233, 10.0004291074), (-18.9593623085, 6.3673056198))
            ThreePointArc((-18.9593623085, 6.3673056198), (-17.3207558174, -9.9995708864), (-3.9664040432, -19.6027456997))
            ThreePointArc((-3.9664040432, -19.6027456997), (-0.0004954941, -19.9999999939), (3.9654327338, -19.6029422086))
            ThreePointArc((3.9654327338, -19.6029422086), (15.4807728275, -12.6627671803), (20, 0))
        make_face()
    extrude(amount=F6_DEPTH)

    # F7 (through all)
    with Locations(Plane(origin=(0, 0, 0), x_dir=(1, 0, 0), z_dir=(0, 0, -1))):
        with Locations((0, 0)):
            Hole(F7_D / 2)


with BuildPart() as f10:
    # F9 (on offset) → F10 (new body)
    with BuildSketch(Plane.XY.offset(16)):
        Circle(F9_R)
    extrude(amount=F10_DEPTH)

    # F11 (on face) → F12 (join)
    with BuildSketch(Plane.XY.offset(32)):
        Circle(F11_R)
    extrude(amount=F12_DEPTH)


solid = Compound([f1.part, f1b.part, f1c.part, f3.part, f6.part, f10.part])
